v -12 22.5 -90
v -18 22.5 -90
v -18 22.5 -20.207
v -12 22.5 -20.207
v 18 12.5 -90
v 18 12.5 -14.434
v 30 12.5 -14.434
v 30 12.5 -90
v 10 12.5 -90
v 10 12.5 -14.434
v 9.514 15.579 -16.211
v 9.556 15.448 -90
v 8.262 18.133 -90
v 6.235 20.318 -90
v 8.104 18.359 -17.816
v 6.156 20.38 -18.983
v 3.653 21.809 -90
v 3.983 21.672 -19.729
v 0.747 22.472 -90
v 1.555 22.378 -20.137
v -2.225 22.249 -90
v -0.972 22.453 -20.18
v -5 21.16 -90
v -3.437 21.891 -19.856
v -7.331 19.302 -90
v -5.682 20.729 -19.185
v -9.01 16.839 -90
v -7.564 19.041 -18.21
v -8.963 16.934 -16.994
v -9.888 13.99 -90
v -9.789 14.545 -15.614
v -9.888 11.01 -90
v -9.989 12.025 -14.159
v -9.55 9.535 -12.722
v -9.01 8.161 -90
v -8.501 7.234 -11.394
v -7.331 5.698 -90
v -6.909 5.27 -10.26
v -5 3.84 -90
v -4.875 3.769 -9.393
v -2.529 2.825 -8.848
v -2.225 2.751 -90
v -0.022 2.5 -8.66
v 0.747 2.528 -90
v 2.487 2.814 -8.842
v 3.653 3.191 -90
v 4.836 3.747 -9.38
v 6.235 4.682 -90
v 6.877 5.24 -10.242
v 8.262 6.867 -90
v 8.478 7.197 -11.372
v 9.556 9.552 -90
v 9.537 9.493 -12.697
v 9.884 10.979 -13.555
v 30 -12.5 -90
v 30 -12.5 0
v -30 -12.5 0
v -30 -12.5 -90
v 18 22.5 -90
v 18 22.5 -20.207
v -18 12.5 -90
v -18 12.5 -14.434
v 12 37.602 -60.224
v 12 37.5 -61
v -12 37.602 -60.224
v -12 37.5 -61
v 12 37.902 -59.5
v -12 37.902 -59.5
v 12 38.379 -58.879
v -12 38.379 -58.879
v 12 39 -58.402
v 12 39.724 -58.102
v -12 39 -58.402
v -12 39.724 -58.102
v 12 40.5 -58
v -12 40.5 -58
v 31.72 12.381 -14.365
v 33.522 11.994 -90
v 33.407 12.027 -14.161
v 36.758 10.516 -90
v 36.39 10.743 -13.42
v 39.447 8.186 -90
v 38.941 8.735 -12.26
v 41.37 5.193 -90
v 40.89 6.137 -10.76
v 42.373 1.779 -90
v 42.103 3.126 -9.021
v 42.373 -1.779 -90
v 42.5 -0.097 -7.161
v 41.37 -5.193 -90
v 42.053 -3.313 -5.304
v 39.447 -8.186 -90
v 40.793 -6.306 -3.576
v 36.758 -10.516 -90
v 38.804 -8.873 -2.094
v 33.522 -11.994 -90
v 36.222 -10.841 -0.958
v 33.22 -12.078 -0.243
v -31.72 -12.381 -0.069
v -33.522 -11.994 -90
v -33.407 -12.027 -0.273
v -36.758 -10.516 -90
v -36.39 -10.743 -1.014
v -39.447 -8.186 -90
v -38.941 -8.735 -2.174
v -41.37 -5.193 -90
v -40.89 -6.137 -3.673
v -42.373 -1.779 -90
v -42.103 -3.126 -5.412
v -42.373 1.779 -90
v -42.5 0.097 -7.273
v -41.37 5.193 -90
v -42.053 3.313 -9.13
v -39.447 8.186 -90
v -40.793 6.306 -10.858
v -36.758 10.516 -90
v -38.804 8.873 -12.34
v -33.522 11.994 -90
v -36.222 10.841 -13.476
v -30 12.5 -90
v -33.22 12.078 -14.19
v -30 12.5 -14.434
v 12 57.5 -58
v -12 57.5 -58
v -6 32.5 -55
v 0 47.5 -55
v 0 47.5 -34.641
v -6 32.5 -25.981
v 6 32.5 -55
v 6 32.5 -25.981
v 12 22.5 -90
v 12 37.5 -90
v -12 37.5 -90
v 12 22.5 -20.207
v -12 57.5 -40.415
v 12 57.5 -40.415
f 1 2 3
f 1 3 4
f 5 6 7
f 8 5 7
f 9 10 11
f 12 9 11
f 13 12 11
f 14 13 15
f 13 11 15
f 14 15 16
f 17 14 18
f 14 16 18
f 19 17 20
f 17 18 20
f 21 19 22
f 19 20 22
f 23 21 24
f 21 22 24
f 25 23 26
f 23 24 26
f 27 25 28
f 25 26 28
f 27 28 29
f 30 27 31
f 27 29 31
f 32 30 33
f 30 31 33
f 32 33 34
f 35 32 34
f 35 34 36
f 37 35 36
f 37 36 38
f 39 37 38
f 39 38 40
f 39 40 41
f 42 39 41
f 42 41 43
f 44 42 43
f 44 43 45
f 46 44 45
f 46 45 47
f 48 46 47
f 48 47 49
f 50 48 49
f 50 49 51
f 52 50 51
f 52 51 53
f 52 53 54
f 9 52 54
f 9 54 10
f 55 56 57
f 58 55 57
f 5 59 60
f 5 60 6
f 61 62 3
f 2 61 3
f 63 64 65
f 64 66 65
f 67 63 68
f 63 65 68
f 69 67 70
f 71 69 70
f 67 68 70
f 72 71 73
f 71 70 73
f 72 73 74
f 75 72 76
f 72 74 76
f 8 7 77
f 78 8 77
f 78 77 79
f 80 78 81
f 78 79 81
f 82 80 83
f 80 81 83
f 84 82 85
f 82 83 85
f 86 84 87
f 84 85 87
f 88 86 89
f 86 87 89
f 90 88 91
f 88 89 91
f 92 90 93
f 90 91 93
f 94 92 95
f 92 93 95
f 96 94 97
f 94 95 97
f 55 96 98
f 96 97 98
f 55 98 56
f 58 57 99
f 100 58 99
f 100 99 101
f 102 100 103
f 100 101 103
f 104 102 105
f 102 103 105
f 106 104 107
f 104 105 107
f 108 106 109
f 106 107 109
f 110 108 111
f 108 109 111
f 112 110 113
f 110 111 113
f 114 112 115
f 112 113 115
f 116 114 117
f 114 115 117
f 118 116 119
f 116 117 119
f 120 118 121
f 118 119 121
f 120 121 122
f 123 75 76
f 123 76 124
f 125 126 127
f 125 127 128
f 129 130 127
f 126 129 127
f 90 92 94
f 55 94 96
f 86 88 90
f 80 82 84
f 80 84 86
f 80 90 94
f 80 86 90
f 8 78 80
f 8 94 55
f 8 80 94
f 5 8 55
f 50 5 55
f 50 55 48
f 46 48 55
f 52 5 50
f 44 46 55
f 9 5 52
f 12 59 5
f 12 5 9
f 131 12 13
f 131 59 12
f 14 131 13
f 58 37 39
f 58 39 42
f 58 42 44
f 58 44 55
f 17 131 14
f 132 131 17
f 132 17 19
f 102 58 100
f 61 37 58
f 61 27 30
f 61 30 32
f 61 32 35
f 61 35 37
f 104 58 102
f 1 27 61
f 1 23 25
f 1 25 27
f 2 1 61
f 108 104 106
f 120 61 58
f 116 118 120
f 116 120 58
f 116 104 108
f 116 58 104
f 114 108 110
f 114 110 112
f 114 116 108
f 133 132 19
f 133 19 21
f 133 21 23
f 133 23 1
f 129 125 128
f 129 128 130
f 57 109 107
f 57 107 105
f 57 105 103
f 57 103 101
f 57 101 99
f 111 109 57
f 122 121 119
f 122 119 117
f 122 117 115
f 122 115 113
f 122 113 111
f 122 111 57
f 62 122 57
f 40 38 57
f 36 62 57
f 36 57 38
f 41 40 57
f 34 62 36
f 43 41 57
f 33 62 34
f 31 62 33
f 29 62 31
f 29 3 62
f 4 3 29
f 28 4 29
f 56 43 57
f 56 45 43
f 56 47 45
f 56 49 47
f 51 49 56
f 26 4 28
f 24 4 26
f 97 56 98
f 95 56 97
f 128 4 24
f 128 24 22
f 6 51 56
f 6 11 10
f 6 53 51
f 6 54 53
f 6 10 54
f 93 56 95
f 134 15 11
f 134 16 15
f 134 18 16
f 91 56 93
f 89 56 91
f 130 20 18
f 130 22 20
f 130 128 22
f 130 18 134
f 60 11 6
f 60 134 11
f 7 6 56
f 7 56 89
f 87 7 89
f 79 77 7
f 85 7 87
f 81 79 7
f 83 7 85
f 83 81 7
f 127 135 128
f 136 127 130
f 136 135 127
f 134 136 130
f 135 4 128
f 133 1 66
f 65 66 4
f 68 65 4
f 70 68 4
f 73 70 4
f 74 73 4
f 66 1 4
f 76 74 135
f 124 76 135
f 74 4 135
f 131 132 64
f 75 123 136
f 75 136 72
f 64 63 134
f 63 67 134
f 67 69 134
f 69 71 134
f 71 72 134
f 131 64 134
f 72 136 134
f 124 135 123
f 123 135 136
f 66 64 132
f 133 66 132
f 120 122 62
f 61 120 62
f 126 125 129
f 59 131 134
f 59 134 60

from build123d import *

# Parameters (mm, degrees)
SKETCH1_R           = 10
BOSS_EXTRUDE1_DEPTH = 90
SKETCH2_W           = 32
SKETCH2_H           = 20
CUT_EXTRUDE1_DEPTH  = 30
FILLET1_R           = 3
CUT_EXTRUDE2_DEPTH  = 55
SKETCH6_W           = 93.565518088
SKETCH6_H           = 91.977475816
CUT_EXTRUDE3_DEPTH  = 55


with BuildPart() as part:
    # Sketch1 → Boss-Extrude1 (new body)
    with BuildSketch(Plane.XY):
        with BuildLine():
            Line((-30, 12.5), (-18, 12.5))
            Line((-18, 12.5), (-18, 22.5))
            Line((-18, 22.5), (-12, 22.5))
            Line((-12, 22.5), (-12, 57.5))
            Line((-12, 57.5), (12, 57.5))
            Line((12, 57.5), (12, 22.5))
            Line((12, 22.5), (18, 22.5))
            Line((18, 22.5), (18, 12.5))
            Line((18, 12.5), (30, 12.5))
            ThreePointArc((30, 12.5), (42.5, 0), (30, -12.5))
            Line((30, -12.5), (-30, -12.5))
            ThreePointArc((-30, -12.5), (-42.5, 0), (-30, 12.5))
        make_face()
        with Locations((0, 12.5)):
            Circle(SKETCH1_R, mode=Mode.SUBTRACT)
    extrude(amount=-BOSS_EXTRUDE1_DEPTH)

    # Sketch2 → Cut-Extrude1 (cut)
    with BuildSketch(Plane(origin=(12, 0, 0), x_dir=(0, 0, -1), z_dir=(1, 0, 0))):
        with Locations((74, 47.5)):
            Rectangle(SKETCH2_W, SKETCH2_H)
    extrude(amount=-CUT_EXTRUDE1_DEPTH, mode=Mode.SUBTRACT)

    # Fillet1
    fillet1_edges = [part.edges().sort_by_distance(p)[0] for p in [
        (0, 37.5, -58),
    ]]
    fillet(fillet1_edges, radius=FILLET1_R)

    # Sketch3 → Cut-Extrude2 (cut)
    with BuildSketch(Plane.XY):
        Polygon((0, 47.5), (-6, 32.5), (6, 32.5), align=None)
    extrude(amount=-CUT_EXTRUDE2_DEPTH, mode=Mode.SUBTRACT)

    # Sketch6 → Cut-Extrude3 (cut)
    with BuildSketch(Plane(origin=(0, -3.125, -5.412658774), x_dir=(1, 0, 0), z_dir=(0, 0.5, 0.866025404))):
        with Locations((1.570824933, 32.896964302)):
            Rectangle(SKETCH6_W, SKETCH6_H)
    extrude(amount=CUT_EXTRUDE3_DEPTH, mode=Mode.SUBTRACT)


solid = part.part
